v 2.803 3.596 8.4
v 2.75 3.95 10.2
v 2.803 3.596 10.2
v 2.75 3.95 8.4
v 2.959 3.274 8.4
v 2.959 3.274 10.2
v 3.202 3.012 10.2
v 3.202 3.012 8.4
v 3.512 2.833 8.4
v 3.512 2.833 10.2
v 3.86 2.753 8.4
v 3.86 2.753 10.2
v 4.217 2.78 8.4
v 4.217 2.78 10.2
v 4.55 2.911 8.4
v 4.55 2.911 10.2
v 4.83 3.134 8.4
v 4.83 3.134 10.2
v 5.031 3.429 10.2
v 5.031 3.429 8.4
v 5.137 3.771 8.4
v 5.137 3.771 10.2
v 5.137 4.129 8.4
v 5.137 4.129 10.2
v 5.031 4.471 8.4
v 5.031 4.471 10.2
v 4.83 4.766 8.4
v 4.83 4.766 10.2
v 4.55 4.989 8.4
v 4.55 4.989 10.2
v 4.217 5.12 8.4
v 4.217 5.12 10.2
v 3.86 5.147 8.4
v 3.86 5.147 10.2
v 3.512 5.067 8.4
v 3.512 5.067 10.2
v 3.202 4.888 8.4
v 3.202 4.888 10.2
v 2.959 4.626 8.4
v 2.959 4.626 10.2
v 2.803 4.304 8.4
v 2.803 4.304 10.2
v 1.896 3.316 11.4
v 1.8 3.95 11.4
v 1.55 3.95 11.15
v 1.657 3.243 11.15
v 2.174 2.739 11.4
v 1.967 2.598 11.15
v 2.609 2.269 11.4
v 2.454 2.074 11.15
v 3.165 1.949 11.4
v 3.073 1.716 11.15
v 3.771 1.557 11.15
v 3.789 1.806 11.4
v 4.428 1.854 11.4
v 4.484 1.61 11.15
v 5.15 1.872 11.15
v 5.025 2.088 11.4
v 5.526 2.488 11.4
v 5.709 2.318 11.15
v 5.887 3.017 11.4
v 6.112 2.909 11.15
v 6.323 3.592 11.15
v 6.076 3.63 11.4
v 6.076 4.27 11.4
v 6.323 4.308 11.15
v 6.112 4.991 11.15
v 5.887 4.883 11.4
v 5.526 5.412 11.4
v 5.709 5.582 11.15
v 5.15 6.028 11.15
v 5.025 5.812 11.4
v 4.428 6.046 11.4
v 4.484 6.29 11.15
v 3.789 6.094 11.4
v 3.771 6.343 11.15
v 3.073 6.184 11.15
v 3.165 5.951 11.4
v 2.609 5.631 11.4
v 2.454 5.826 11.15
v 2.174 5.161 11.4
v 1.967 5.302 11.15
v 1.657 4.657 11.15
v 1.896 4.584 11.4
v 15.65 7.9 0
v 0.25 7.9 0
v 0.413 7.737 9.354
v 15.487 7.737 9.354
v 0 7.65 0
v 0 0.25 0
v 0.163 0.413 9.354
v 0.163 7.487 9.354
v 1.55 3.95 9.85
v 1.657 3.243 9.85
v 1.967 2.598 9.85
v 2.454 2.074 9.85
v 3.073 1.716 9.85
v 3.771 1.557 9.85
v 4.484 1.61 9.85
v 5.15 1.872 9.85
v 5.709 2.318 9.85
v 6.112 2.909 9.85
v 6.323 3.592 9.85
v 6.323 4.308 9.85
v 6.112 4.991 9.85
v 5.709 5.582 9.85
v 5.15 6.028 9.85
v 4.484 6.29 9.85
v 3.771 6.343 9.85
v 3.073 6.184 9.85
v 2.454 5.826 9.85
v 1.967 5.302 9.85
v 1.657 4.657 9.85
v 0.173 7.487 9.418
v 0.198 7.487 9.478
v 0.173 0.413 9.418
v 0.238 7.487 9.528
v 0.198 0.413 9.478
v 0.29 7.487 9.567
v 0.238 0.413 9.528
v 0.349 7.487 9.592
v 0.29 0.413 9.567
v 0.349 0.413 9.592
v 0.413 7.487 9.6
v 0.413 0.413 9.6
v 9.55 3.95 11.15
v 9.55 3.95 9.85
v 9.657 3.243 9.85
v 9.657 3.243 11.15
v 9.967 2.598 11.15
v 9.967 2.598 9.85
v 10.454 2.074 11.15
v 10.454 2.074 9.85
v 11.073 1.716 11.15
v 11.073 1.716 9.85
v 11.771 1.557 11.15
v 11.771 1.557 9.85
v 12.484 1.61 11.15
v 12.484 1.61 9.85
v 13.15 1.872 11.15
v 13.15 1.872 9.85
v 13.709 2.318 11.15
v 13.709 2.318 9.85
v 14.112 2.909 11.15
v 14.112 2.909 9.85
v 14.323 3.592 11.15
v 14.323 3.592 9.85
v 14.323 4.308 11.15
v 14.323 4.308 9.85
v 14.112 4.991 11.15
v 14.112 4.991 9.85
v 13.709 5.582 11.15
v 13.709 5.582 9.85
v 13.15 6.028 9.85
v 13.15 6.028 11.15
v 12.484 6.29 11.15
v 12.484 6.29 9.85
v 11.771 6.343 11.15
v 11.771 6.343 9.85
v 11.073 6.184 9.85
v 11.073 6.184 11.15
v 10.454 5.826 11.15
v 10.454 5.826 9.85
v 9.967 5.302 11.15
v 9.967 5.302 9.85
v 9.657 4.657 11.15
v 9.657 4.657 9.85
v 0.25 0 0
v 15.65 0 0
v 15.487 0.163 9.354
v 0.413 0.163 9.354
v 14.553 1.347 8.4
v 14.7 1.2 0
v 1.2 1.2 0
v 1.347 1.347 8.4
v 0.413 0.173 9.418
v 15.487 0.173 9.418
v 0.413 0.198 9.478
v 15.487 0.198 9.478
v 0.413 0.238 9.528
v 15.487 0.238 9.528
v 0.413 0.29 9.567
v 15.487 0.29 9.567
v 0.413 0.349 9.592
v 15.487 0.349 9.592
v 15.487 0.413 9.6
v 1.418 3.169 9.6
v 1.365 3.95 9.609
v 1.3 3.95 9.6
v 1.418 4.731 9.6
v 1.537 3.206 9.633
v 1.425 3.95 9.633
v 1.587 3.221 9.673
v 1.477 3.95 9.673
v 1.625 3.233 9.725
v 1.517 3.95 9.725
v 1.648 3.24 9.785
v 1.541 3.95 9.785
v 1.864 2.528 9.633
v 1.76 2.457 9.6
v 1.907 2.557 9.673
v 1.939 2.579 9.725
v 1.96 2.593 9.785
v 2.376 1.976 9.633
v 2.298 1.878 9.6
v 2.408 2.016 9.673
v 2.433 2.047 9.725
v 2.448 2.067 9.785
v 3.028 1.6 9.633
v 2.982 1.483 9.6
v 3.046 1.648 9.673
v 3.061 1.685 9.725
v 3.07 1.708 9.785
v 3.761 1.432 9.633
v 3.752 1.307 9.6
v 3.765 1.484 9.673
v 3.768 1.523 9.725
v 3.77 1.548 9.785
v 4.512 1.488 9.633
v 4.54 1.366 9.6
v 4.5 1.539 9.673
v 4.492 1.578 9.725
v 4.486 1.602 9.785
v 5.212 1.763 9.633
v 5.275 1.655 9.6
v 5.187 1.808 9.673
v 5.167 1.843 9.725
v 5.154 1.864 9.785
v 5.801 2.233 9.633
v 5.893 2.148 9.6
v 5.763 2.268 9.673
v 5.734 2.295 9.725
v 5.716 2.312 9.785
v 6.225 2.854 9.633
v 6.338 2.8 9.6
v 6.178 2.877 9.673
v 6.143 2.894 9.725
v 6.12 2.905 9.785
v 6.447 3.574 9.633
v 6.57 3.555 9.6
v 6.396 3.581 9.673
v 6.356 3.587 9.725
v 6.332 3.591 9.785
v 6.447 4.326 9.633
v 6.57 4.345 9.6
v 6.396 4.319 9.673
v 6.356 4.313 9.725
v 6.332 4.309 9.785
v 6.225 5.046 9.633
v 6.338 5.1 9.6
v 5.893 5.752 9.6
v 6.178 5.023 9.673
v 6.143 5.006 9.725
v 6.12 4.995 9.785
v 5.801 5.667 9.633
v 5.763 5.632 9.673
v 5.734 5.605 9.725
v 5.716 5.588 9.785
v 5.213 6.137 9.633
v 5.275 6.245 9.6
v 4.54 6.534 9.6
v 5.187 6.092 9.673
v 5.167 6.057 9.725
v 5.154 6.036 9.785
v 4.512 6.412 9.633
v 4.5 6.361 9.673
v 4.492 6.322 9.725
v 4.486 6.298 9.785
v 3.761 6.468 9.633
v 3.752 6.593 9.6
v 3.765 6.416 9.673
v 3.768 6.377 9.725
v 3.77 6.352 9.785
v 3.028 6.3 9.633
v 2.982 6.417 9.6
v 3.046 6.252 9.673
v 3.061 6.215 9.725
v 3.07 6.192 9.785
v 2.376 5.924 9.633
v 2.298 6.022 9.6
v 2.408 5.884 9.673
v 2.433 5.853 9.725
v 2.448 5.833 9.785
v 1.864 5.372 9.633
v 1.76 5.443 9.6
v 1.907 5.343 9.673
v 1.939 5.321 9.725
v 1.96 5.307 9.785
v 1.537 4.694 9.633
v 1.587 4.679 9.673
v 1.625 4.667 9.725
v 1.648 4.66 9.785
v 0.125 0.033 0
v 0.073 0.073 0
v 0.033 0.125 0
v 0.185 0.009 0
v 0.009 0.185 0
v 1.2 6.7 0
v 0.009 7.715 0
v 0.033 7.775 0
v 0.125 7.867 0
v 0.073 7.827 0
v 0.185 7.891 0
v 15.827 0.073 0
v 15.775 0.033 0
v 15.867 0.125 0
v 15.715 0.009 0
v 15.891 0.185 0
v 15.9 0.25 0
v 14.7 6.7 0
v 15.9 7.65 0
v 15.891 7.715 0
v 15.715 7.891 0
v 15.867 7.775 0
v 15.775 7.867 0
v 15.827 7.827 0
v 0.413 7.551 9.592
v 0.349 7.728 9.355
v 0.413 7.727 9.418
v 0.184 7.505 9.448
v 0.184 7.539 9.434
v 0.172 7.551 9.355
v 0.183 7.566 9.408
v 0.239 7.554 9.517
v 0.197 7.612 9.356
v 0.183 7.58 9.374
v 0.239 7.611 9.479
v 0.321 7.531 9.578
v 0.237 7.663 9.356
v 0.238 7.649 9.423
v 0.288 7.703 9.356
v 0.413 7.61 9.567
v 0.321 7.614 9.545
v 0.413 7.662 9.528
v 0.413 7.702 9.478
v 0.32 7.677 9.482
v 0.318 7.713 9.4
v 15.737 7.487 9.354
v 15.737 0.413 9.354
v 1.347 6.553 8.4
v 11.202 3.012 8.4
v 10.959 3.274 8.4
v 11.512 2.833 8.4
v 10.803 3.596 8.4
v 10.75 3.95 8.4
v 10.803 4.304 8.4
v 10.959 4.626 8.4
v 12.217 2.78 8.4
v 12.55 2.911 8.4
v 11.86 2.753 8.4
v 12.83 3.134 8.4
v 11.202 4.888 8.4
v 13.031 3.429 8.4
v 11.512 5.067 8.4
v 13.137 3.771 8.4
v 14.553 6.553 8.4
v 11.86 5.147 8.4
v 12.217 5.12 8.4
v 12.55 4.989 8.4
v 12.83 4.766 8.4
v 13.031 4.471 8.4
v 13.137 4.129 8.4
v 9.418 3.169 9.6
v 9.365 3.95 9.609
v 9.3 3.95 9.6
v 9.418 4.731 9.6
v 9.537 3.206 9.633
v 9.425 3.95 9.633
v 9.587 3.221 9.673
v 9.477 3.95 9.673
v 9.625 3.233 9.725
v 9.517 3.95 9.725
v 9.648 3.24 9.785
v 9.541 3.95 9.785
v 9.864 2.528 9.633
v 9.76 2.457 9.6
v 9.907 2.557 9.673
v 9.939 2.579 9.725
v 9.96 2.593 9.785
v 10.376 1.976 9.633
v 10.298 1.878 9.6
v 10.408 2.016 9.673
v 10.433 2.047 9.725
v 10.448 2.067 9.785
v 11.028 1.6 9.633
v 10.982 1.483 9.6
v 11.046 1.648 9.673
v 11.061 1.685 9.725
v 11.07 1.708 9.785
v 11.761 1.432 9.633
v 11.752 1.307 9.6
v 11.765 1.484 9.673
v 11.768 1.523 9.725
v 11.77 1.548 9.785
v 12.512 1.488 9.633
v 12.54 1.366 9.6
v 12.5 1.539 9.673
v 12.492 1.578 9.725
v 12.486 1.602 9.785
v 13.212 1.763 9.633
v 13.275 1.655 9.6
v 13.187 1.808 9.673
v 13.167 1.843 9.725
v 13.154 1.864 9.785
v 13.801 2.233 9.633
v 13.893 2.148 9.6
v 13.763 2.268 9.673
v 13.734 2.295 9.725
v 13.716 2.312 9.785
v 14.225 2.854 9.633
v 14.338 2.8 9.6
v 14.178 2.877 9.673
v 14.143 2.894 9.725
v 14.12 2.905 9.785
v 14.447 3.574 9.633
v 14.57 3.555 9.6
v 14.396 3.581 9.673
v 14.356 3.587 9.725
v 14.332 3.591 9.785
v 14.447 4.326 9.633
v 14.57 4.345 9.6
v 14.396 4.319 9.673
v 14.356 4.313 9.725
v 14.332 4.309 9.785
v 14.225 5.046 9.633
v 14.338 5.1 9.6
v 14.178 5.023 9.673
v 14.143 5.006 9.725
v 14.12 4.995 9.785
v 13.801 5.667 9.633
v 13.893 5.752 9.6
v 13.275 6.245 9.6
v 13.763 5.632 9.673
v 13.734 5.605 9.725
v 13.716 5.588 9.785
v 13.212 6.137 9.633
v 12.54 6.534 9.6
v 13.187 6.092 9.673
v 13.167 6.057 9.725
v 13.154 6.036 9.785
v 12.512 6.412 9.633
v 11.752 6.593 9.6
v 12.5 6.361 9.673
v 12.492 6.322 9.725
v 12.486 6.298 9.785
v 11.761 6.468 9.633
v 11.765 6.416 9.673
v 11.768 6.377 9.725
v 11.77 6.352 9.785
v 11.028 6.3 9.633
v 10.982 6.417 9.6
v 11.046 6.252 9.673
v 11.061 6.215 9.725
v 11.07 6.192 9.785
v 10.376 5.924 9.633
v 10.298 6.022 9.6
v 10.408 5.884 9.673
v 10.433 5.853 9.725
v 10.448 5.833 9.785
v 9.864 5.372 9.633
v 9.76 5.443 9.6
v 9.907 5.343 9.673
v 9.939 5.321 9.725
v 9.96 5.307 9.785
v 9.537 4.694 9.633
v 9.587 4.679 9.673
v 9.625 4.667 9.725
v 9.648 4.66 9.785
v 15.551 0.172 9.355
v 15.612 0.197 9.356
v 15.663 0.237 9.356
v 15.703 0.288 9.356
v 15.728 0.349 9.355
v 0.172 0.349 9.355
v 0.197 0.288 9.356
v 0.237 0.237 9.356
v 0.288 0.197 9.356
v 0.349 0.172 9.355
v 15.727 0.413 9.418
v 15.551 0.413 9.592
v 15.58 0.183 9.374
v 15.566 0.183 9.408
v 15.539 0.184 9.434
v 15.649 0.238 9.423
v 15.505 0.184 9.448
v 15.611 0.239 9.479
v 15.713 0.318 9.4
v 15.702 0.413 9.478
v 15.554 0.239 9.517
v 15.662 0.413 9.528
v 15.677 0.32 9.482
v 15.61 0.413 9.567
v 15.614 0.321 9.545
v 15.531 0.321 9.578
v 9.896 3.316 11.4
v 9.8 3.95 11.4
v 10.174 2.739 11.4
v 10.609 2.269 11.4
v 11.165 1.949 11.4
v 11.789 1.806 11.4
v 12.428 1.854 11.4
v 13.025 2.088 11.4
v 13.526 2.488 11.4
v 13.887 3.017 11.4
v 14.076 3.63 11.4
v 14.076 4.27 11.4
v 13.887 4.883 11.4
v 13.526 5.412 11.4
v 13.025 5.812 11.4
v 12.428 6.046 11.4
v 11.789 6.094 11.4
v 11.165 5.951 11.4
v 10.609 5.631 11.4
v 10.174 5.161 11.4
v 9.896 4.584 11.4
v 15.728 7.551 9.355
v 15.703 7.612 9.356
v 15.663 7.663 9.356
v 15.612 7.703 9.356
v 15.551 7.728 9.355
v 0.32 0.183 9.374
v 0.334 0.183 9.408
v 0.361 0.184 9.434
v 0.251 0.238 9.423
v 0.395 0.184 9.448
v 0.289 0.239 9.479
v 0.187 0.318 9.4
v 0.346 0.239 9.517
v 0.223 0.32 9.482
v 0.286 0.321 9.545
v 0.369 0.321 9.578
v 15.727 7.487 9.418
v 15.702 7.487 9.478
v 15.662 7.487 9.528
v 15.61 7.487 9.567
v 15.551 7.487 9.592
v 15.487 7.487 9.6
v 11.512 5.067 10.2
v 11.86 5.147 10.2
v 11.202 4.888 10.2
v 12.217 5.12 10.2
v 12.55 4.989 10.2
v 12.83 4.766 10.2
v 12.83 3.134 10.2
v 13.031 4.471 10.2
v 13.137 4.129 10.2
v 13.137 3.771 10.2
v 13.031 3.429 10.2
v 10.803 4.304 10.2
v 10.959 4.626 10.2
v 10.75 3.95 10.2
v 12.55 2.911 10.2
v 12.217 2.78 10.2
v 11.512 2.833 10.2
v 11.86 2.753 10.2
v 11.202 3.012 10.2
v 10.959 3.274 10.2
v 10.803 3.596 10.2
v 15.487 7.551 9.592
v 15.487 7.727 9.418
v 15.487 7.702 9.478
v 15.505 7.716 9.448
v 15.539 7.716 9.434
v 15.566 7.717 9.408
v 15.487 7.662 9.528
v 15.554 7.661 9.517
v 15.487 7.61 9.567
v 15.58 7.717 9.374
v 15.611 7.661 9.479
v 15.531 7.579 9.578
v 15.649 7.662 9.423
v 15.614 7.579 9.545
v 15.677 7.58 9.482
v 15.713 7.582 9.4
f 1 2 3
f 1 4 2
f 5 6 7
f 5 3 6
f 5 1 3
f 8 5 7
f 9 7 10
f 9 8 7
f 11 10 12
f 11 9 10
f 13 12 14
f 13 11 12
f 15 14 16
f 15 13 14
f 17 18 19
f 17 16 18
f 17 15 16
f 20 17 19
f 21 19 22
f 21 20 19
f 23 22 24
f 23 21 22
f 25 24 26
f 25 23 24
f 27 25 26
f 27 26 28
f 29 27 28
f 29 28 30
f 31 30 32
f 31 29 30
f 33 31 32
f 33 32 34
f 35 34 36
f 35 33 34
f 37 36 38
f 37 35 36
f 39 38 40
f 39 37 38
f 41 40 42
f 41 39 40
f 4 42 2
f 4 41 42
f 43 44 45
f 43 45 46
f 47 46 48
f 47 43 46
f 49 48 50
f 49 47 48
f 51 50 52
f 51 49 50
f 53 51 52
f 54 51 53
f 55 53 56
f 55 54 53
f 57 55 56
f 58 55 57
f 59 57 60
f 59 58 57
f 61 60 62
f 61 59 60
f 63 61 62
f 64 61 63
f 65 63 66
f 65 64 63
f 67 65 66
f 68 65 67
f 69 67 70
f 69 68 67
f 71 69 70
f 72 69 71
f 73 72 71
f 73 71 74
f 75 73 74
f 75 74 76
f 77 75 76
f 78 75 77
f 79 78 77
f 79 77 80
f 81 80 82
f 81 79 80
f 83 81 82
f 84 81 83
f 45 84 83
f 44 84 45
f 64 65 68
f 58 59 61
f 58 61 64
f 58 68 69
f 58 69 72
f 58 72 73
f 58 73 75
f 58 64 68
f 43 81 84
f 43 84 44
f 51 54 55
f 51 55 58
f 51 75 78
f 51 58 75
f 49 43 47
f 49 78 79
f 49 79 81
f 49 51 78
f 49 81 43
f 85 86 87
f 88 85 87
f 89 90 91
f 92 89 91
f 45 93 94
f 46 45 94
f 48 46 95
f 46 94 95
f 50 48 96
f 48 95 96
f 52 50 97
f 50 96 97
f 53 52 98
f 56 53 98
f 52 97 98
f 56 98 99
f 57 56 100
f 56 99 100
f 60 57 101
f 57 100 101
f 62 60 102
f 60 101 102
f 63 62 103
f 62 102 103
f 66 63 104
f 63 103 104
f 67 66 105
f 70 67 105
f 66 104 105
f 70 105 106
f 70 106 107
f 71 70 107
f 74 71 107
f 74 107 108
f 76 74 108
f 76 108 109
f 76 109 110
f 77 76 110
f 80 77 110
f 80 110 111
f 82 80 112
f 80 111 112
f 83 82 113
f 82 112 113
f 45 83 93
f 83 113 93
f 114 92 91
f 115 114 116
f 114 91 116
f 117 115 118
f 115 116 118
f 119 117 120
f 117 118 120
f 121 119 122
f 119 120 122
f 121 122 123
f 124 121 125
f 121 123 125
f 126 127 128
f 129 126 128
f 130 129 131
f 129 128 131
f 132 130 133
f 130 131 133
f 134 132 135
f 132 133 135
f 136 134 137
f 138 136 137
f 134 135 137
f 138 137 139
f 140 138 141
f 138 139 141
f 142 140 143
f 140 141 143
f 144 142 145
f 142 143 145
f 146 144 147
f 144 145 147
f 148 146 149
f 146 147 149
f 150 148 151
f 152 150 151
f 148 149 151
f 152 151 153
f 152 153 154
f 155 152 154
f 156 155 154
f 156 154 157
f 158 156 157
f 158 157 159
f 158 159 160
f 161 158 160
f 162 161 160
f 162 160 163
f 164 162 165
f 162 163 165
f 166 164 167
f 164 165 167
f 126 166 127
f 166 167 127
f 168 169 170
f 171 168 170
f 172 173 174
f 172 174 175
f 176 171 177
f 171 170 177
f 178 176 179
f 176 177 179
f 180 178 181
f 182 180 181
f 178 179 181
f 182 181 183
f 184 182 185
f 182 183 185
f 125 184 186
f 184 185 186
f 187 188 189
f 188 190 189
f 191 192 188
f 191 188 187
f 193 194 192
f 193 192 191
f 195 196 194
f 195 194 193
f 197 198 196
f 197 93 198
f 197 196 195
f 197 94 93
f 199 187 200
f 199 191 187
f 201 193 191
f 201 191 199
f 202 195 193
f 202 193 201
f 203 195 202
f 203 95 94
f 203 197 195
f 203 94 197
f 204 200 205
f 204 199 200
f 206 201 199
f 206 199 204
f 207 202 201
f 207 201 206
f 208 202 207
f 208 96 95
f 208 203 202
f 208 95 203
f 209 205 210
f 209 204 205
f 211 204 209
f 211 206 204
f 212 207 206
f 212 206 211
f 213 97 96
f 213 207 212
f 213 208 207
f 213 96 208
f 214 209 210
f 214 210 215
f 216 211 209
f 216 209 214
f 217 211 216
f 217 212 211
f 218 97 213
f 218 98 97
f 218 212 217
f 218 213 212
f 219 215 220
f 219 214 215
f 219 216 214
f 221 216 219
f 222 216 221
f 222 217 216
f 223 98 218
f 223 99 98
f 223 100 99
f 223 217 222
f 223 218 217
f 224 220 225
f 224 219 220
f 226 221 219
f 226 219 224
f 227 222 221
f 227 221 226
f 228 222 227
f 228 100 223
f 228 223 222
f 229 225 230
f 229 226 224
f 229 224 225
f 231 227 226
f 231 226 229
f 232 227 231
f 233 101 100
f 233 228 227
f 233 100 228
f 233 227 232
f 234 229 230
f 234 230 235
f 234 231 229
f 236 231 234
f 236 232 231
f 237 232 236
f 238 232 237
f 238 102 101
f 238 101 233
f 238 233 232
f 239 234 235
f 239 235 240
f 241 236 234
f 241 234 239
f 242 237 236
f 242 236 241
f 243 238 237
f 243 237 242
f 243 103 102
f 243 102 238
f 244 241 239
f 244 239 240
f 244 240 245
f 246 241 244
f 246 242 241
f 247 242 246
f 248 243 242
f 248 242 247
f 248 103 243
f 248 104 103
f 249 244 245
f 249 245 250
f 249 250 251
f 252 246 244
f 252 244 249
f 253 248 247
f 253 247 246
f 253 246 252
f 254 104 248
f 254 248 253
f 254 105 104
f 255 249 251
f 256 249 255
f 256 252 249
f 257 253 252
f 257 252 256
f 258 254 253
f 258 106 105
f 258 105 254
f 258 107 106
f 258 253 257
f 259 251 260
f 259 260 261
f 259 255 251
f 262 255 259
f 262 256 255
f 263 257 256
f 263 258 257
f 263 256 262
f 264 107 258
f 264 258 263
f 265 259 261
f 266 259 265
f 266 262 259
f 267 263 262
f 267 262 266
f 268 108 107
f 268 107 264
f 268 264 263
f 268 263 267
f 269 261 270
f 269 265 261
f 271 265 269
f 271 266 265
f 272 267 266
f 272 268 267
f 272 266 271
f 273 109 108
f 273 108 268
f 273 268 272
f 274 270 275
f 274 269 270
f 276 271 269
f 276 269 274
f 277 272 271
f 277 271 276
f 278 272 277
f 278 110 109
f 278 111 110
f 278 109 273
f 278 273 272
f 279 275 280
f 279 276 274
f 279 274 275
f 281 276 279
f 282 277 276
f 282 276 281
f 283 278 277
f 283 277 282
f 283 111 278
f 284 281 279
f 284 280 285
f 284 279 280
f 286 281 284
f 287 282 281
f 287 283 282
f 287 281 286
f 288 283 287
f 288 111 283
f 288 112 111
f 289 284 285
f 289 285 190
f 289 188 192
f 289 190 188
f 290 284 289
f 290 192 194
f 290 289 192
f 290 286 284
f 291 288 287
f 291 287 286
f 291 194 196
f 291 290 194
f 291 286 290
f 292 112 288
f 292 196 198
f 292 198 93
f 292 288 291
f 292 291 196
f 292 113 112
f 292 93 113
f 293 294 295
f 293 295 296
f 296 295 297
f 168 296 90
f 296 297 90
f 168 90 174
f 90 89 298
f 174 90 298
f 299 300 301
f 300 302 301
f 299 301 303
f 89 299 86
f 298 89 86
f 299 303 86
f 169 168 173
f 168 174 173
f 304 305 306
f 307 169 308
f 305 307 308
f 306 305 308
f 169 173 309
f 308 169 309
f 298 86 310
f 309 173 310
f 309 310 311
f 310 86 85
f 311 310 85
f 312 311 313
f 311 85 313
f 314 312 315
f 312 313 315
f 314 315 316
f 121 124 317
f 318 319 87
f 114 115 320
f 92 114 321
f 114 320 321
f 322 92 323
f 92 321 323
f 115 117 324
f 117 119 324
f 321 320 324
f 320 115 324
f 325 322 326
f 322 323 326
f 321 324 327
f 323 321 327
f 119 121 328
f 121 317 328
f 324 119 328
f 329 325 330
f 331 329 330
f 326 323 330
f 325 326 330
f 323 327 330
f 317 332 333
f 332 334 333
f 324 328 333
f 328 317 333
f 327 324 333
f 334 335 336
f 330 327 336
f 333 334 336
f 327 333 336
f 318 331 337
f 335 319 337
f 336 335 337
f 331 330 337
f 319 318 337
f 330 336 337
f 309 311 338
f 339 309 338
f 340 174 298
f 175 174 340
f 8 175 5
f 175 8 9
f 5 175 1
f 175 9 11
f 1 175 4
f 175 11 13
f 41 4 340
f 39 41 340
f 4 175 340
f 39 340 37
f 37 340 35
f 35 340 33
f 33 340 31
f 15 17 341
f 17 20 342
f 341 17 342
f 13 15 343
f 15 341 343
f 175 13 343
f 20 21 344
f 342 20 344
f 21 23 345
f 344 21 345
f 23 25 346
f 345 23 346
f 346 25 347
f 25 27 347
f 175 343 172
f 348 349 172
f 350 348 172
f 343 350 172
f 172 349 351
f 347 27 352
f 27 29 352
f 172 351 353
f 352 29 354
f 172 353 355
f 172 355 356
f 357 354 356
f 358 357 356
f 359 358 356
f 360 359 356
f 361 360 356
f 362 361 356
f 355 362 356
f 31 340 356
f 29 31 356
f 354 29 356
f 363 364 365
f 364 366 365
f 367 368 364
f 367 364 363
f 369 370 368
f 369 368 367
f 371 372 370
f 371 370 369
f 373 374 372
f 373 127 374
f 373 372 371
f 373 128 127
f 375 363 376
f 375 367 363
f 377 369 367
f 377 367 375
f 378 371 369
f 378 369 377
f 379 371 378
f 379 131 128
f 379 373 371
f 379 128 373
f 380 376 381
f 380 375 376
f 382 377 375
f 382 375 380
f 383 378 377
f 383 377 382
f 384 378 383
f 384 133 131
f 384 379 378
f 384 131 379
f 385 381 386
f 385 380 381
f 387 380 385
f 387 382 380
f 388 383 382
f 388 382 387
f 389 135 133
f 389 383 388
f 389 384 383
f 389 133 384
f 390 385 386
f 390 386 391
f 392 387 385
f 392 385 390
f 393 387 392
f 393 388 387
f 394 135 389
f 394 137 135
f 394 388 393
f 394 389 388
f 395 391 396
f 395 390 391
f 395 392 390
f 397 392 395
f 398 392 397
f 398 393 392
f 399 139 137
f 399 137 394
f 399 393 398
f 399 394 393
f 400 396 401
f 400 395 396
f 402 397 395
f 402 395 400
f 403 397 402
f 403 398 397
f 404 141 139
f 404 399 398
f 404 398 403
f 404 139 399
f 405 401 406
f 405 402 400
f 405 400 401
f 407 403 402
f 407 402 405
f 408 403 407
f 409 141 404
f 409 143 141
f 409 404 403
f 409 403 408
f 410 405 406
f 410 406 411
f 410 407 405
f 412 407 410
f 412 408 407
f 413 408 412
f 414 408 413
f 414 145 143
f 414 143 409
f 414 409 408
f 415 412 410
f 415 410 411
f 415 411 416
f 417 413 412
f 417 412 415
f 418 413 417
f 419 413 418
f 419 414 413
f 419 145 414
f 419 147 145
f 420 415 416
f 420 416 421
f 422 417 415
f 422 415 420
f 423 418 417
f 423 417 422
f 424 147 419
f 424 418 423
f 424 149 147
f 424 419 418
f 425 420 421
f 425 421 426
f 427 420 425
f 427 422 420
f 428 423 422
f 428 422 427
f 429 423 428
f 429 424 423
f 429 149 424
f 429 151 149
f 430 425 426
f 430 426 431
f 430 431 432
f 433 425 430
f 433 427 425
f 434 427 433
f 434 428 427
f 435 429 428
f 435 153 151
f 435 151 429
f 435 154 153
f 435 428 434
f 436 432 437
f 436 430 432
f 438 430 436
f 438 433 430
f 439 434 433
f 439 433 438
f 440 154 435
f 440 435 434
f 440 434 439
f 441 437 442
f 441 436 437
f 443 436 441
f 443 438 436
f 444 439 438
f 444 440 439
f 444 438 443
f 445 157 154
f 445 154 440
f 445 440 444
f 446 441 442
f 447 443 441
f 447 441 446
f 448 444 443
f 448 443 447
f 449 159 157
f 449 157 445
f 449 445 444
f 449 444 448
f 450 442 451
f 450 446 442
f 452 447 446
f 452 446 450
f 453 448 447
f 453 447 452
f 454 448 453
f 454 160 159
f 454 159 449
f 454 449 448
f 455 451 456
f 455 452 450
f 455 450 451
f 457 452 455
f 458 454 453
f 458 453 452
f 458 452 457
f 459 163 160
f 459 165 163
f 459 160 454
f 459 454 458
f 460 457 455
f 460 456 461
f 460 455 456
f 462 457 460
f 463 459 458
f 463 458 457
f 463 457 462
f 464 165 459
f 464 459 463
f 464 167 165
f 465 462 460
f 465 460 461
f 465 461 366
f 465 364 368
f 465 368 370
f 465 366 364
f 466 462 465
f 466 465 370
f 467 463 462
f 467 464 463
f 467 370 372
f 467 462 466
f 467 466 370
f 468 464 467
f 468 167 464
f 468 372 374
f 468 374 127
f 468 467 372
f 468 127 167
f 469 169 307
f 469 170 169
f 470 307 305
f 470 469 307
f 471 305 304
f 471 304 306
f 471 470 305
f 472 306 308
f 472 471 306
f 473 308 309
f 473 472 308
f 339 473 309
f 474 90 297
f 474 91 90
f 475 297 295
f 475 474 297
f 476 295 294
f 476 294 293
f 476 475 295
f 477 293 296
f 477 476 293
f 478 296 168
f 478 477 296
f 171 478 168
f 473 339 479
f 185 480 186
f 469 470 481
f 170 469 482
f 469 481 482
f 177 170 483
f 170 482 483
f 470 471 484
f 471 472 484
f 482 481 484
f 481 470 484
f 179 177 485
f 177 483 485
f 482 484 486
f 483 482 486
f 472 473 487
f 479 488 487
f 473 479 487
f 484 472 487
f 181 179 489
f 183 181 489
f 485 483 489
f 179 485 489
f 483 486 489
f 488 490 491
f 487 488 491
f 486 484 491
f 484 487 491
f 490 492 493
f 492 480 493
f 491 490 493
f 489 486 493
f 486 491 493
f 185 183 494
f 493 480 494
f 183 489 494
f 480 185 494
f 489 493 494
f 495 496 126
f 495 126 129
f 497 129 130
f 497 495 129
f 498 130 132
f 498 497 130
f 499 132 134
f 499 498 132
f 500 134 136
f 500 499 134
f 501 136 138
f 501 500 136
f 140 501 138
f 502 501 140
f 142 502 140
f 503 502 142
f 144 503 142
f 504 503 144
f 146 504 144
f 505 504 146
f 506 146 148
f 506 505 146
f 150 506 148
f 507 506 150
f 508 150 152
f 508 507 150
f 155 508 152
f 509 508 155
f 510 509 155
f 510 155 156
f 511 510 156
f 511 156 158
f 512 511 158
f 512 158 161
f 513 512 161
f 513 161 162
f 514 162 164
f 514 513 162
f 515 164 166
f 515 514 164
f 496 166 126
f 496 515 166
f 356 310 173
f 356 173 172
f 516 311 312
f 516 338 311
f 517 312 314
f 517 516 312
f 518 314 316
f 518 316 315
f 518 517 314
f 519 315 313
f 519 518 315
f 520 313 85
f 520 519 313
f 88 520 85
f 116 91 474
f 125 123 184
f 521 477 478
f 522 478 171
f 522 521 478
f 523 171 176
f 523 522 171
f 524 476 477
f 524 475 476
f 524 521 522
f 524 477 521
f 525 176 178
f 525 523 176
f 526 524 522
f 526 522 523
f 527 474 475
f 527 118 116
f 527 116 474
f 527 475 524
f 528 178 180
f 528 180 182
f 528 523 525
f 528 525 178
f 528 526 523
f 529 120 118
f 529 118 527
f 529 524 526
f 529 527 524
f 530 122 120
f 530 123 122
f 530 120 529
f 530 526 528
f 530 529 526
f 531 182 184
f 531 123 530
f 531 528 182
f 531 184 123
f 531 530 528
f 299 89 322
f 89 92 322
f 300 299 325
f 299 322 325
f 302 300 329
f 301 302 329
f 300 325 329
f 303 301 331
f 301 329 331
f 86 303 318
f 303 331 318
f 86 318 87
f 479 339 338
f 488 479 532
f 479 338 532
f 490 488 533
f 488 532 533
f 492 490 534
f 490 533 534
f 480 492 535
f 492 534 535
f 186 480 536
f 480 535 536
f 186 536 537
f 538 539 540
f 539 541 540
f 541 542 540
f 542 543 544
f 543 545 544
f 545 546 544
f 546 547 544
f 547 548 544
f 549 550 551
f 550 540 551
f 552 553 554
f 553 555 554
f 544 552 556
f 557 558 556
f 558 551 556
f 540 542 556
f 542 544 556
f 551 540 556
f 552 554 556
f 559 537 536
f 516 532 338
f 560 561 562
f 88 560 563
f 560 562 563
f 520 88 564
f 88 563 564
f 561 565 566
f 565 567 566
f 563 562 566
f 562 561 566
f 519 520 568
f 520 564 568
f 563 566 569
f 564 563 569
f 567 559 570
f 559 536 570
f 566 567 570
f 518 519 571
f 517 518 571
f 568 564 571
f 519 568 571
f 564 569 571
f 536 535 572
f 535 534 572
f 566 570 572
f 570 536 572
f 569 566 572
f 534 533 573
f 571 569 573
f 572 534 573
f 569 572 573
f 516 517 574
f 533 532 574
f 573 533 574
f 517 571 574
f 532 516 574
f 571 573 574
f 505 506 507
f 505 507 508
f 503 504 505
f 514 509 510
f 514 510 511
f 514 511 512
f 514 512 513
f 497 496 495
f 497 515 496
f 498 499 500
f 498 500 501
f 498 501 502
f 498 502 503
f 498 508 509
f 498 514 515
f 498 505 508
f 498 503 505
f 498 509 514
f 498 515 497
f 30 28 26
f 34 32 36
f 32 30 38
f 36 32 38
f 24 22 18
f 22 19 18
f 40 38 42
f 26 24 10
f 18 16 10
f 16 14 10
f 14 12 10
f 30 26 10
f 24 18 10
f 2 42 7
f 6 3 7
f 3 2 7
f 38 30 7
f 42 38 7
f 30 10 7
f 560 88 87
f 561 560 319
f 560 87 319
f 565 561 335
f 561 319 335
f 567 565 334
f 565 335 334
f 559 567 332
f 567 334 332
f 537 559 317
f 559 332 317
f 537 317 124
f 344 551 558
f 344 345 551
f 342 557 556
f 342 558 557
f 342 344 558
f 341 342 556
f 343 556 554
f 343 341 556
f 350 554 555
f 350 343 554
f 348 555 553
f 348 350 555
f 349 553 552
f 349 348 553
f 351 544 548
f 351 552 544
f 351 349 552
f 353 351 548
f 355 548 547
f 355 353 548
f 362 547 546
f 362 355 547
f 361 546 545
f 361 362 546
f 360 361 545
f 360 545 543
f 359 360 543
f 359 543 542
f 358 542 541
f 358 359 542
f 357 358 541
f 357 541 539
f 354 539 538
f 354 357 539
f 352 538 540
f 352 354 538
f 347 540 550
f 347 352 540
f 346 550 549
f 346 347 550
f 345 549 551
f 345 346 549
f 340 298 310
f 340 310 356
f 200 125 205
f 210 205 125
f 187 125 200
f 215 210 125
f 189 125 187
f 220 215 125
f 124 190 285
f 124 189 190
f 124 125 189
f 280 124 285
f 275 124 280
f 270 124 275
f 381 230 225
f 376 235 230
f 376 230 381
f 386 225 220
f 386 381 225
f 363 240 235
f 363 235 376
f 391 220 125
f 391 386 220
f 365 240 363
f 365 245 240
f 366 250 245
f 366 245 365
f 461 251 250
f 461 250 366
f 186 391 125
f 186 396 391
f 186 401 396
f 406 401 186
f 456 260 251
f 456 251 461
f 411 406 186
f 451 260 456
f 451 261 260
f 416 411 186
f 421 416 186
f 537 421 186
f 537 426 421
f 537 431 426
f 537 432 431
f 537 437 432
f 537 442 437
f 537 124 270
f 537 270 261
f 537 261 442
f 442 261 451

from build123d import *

# Parameters (mm, degrees)
SKETCH1_W            = 15.9
SKETCH1_H            = 7.9
MAIN_BODY_DEPTH      = 9.6
MAIN_BODY_TAPER      = 1
SKETCH2_R            = 2.4
POST_DEPTH           = 1.8
POST_LPATTERN1_COUNT = 2
POST_LPATTERN1_PITCH = 8
SHELL1_T             = -1.2
BODY_FILLET_R        = 0.25
POST_CHAMFER_SIZE    = 0.25


with BuildPart() as part:
    # Sketch1 → Main Body (new body)
    with BuildSketch(Plane.XY):
        with Locations((7.95, 3.95)):
            Rectangle(SKETCH1_W, SKETCH1_H)
    extrude(amount=MAIN_BODY_DEPTH, taper=MAIN_BODY_TAPER)

    # Sketch2 → Post (add)
    with BuildSketch(Plane.XY.offset(9.6)):
        with Locations(Location((3.95, 3.95, 0), (0, 0, 180))):
            Circle(SKETCH2_R)
    post = extrude(amount=POST_DEPTH)

    # Post LPattern1: Post ×2
    with Locations(*[(i * POST_LPATTERN1_PITCH, 0, 0) for i in range(1, POST_LPATTERN1_COUNT)]):
        add(post)

    # Shell1
    shell1_openings = [part.faces().sort_by_distance(p)[0] for p in [
        (7.95, 3.95, 0),
    ]]
    offset(amount=SHELL1_T, openings=shell1_openings, kind=Kind.INTERSECTION)

    # Body Fillet
    body_fillet_edges = [part.edges().sort_by_distance(p)[0] for p in [
        (15.732431377, 3.95, 9.6),
        (6.35, 3.95, 9.6),
        (7.95, 7.732431377, 9.6),
        (14.35, 3.95, 9.6),
        (0.167568623, 3.95, 9.6),
        (0.083784312, 7.816215688, 4.8),
        (15.816215688, 7.816215688, 4.8),
        (15.816215688, 0.083784312, 4.8),
        (0.083784312, 0.083784312, 4.8),
        (7.95, 0.167568623, 9.6),
    ]]
    fillet(body_fillet_edges, radius=BODY_FILLET_R)

    # Post Chamfer
    post_chamfer_edges = [part.edges().sort_by_distance(p)[0] for p in [
        (6.35, 3.95, 11.4),
        (14.35, 3.95, 11.4),
    ]]
    chamfer(post_chamfer_edges, length=POST_CHAMFER_SIZE)


solid = part.part
